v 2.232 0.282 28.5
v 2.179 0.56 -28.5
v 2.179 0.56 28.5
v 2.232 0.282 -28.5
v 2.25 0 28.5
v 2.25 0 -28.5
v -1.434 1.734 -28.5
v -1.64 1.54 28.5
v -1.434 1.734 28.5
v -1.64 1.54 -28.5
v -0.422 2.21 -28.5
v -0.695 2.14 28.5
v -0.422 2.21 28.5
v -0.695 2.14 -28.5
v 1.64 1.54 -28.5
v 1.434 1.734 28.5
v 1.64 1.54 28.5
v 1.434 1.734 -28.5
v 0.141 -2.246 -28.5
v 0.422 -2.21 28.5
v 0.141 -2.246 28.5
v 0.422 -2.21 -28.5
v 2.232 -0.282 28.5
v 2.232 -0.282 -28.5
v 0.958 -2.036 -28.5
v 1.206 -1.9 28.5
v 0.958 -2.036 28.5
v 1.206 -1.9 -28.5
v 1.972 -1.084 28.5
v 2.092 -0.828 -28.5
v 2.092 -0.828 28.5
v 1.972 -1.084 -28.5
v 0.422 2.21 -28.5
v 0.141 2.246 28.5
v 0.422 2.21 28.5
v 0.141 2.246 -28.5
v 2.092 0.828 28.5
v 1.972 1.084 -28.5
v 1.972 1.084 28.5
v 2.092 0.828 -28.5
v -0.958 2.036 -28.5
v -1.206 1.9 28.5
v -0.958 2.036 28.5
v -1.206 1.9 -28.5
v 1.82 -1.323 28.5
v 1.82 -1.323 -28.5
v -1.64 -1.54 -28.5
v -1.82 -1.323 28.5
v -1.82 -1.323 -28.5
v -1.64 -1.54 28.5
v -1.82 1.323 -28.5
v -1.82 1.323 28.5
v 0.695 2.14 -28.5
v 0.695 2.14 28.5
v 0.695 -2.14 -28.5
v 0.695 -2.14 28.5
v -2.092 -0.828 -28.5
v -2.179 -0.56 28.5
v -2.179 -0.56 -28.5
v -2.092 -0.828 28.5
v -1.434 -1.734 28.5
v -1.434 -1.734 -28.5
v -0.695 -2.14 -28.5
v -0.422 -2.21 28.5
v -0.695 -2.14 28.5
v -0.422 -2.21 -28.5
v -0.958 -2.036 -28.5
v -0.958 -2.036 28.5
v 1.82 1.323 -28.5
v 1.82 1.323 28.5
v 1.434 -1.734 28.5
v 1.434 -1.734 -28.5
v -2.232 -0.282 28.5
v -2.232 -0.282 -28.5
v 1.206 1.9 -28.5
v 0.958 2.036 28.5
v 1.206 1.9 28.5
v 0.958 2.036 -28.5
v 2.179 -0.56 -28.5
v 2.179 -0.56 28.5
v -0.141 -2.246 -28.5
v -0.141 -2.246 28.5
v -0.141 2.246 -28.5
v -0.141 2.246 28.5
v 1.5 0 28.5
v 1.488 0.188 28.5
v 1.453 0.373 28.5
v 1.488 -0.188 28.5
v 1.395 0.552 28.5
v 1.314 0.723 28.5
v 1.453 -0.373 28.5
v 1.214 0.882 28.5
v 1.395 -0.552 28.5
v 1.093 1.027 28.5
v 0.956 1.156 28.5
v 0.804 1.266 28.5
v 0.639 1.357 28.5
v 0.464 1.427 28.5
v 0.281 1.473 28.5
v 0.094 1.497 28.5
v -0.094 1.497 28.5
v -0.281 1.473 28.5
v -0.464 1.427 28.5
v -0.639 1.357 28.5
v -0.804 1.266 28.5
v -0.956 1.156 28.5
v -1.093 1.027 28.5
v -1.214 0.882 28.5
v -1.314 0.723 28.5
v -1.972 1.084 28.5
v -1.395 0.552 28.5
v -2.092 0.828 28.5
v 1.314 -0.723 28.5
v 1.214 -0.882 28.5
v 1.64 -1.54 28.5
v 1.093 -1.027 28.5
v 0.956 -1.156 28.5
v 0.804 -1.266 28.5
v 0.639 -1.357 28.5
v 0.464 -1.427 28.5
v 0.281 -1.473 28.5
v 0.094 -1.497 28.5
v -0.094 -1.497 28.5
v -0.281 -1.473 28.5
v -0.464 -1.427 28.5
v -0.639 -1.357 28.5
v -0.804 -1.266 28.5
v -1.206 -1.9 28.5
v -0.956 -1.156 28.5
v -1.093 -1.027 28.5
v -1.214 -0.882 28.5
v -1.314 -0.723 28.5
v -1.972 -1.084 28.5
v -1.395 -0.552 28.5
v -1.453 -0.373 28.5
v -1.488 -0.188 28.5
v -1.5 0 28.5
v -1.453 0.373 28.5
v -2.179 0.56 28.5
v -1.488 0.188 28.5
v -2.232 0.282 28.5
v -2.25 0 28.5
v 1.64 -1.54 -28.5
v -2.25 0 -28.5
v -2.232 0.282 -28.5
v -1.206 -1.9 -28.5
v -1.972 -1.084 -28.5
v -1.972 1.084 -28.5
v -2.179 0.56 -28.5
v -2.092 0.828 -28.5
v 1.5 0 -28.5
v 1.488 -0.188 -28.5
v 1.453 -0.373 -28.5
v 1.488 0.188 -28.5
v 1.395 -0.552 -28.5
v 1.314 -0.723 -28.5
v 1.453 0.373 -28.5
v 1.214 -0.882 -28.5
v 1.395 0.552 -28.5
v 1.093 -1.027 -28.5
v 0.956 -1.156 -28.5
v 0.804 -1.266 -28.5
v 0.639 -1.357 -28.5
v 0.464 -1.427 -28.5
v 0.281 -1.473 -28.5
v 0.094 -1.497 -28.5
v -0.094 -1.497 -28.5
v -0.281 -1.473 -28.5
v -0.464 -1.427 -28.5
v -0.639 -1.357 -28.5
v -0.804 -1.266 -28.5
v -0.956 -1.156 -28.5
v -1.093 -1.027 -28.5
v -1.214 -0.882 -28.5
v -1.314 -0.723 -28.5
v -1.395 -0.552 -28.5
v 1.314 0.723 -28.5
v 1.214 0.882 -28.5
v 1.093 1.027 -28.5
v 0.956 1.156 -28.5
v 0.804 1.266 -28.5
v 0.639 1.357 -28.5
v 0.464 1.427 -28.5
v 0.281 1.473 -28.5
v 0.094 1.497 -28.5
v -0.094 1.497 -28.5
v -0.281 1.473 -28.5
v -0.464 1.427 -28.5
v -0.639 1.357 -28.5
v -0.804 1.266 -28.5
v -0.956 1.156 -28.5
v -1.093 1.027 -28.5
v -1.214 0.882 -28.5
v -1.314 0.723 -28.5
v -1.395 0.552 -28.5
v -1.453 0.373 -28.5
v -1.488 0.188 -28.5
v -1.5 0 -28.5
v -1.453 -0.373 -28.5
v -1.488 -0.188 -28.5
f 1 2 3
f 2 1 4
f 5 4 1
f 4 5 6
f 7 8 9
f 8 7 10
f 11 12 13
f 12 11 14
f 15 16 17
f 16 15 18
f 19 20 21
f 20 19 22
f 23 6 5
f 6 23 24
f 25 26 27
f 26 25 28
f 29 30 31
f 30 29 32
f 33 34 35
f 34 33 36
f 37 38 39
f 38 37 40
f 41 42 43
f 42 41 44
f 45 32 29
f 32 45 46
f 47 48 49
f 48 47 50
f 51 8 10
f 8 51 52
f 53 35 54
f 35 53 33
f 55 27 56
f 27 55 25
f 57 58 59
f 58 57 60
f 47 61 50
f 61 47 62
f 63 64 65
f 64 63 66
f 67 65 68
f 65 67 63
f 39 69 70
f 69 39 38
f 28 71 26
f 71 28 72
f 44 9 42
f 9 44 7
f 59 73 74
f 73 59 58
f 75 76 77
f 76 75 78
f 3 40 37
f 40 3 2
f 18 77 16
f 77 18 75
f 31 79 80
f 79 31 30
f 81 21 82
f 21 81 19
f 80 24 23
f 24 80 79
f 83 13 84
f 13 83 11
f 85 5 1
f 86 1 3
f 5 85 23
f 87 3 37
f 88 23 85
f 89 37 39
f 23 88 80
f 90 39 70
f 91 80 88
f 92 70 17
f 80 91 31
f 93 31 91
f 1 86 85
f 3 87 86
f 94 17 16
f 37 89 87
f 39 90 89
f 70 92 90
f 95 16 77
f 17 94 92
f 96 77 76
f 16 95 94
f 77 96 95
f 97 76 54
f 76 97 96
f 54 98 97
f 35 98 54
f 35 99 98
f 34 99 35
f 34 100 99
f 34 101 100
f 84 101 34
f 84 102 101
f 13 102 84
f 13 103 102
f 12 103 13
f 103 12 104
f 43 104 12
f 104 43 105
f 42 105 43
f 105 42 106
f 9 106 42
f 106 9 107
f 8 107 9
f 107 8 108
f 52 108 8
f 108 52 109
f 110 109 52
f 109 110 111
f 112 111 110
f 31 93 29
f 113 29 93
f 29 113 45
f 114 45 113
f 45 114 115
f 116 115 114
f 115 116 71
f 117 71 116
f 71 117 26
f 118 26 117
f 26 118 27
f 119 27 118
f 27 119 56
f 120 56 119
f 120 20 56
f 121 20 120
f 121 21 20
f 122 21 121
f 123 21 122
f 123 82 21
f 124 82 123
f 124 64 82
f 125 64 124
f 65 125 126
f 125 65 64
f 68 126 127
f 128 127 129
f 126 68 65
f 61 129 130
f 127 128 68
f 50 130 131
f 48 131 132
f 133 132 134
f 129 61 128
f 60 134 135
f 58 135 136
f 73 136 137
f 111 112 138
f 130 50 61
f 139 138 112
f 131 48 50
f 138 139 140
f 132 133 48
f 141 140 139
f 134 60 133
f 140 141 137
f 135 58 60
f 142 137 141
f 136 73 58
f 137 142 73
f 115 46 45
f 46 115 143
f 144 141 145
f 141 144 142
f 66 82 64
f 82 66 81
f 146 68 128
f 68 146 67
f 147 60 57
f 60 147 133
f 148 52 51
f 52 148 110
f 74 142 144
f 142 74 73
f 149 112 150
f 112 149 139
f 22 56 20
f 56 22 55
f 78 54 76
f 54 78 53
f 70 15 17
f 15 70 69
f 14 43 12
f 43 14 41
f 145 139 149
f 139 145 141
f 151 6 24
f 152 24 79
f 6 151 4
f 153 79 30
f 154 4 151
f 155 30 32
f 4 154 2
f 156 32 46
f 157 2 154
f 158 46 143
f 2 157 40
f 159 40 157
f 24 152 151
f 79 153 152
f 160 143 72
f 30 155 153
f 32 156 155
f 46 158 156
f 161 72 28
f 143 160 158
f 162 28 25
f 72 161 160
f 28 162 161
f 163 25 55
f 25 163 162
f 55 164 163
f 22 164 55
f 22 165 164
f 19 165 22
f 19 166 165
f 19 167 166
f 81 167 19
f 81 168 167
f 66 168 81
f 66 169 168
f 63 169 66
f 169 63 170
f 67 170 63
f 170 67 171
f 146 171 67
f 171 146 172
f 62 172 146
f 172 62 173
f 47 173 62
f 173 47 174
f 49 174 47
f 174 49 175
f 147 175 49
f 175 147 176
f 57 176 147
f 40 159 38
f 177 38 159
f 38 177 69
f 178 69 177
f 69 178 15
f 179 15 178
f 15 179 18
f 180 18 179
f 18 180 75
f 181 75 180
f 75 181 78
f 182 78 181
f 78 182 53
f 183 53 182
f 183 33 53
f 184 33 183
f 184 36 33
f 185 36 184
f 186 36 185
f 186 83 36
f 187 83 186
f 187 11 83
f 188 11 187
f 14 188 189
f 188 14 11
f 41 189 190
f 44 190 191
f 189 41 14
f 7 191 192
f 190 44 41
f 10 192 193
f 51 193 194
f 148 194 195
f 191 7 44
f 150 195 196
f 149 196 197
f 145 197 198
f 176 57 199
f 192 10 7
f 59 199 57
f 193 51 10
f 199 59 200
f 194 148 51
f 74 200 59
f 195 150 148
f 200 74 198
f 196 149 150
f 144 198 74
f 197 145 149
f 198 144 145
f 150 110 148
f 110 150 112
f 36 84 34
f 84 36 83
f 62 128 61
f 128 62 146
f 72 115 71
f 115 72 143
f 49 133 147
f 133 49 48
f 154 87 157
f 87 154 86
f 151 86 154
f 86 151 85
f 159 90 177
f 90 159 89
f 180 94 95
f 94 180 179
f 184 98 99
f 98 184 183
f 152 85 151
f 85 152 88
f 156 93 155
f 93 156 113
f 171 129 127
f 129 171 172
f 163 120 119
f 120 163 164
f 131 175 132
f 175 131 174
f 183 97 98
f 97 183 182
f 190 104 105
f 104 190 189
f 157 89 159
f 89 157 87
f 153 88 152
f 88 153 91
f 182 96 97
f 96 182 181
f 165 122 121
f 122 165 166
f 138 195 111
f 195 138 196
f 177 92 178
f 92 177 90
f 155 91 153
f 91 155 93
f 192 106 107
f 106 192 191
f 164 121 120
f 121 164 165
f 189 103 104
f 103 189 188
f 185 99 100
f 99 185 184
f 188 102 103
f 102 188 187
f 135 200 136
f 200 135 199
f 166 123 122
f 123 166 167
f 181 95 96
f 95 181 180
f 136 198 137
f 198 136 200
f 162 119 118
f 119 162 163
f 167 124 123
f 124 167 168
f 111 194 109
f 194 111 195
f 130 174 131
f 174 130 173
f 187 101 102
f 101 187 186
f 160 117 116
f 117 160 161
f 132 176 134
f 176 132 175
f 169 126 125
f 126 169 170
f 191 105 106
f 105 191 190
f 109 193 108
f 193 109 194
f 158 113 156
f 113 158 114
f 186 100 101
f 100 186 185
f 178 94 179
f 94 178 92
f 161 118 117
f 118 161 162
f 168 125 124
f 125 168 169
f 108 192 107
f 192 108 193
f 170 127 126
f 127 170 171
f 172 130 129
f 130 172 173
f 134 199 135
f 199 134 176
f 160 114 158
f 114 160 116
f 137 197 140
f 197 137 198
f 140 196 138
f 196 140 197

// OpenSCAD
$fn = 50;


difference() {
	union() {
		translate(v = [0, 0, -28.5000000000]) {
			cylinder(h = 57, r = 2.2500000000);
		}
	}
	union() {
		translate(v = [0, 0, -100.0000000000]) {
			cylinder(h = 200, r = 1.5000000000);
		}
	}
}
